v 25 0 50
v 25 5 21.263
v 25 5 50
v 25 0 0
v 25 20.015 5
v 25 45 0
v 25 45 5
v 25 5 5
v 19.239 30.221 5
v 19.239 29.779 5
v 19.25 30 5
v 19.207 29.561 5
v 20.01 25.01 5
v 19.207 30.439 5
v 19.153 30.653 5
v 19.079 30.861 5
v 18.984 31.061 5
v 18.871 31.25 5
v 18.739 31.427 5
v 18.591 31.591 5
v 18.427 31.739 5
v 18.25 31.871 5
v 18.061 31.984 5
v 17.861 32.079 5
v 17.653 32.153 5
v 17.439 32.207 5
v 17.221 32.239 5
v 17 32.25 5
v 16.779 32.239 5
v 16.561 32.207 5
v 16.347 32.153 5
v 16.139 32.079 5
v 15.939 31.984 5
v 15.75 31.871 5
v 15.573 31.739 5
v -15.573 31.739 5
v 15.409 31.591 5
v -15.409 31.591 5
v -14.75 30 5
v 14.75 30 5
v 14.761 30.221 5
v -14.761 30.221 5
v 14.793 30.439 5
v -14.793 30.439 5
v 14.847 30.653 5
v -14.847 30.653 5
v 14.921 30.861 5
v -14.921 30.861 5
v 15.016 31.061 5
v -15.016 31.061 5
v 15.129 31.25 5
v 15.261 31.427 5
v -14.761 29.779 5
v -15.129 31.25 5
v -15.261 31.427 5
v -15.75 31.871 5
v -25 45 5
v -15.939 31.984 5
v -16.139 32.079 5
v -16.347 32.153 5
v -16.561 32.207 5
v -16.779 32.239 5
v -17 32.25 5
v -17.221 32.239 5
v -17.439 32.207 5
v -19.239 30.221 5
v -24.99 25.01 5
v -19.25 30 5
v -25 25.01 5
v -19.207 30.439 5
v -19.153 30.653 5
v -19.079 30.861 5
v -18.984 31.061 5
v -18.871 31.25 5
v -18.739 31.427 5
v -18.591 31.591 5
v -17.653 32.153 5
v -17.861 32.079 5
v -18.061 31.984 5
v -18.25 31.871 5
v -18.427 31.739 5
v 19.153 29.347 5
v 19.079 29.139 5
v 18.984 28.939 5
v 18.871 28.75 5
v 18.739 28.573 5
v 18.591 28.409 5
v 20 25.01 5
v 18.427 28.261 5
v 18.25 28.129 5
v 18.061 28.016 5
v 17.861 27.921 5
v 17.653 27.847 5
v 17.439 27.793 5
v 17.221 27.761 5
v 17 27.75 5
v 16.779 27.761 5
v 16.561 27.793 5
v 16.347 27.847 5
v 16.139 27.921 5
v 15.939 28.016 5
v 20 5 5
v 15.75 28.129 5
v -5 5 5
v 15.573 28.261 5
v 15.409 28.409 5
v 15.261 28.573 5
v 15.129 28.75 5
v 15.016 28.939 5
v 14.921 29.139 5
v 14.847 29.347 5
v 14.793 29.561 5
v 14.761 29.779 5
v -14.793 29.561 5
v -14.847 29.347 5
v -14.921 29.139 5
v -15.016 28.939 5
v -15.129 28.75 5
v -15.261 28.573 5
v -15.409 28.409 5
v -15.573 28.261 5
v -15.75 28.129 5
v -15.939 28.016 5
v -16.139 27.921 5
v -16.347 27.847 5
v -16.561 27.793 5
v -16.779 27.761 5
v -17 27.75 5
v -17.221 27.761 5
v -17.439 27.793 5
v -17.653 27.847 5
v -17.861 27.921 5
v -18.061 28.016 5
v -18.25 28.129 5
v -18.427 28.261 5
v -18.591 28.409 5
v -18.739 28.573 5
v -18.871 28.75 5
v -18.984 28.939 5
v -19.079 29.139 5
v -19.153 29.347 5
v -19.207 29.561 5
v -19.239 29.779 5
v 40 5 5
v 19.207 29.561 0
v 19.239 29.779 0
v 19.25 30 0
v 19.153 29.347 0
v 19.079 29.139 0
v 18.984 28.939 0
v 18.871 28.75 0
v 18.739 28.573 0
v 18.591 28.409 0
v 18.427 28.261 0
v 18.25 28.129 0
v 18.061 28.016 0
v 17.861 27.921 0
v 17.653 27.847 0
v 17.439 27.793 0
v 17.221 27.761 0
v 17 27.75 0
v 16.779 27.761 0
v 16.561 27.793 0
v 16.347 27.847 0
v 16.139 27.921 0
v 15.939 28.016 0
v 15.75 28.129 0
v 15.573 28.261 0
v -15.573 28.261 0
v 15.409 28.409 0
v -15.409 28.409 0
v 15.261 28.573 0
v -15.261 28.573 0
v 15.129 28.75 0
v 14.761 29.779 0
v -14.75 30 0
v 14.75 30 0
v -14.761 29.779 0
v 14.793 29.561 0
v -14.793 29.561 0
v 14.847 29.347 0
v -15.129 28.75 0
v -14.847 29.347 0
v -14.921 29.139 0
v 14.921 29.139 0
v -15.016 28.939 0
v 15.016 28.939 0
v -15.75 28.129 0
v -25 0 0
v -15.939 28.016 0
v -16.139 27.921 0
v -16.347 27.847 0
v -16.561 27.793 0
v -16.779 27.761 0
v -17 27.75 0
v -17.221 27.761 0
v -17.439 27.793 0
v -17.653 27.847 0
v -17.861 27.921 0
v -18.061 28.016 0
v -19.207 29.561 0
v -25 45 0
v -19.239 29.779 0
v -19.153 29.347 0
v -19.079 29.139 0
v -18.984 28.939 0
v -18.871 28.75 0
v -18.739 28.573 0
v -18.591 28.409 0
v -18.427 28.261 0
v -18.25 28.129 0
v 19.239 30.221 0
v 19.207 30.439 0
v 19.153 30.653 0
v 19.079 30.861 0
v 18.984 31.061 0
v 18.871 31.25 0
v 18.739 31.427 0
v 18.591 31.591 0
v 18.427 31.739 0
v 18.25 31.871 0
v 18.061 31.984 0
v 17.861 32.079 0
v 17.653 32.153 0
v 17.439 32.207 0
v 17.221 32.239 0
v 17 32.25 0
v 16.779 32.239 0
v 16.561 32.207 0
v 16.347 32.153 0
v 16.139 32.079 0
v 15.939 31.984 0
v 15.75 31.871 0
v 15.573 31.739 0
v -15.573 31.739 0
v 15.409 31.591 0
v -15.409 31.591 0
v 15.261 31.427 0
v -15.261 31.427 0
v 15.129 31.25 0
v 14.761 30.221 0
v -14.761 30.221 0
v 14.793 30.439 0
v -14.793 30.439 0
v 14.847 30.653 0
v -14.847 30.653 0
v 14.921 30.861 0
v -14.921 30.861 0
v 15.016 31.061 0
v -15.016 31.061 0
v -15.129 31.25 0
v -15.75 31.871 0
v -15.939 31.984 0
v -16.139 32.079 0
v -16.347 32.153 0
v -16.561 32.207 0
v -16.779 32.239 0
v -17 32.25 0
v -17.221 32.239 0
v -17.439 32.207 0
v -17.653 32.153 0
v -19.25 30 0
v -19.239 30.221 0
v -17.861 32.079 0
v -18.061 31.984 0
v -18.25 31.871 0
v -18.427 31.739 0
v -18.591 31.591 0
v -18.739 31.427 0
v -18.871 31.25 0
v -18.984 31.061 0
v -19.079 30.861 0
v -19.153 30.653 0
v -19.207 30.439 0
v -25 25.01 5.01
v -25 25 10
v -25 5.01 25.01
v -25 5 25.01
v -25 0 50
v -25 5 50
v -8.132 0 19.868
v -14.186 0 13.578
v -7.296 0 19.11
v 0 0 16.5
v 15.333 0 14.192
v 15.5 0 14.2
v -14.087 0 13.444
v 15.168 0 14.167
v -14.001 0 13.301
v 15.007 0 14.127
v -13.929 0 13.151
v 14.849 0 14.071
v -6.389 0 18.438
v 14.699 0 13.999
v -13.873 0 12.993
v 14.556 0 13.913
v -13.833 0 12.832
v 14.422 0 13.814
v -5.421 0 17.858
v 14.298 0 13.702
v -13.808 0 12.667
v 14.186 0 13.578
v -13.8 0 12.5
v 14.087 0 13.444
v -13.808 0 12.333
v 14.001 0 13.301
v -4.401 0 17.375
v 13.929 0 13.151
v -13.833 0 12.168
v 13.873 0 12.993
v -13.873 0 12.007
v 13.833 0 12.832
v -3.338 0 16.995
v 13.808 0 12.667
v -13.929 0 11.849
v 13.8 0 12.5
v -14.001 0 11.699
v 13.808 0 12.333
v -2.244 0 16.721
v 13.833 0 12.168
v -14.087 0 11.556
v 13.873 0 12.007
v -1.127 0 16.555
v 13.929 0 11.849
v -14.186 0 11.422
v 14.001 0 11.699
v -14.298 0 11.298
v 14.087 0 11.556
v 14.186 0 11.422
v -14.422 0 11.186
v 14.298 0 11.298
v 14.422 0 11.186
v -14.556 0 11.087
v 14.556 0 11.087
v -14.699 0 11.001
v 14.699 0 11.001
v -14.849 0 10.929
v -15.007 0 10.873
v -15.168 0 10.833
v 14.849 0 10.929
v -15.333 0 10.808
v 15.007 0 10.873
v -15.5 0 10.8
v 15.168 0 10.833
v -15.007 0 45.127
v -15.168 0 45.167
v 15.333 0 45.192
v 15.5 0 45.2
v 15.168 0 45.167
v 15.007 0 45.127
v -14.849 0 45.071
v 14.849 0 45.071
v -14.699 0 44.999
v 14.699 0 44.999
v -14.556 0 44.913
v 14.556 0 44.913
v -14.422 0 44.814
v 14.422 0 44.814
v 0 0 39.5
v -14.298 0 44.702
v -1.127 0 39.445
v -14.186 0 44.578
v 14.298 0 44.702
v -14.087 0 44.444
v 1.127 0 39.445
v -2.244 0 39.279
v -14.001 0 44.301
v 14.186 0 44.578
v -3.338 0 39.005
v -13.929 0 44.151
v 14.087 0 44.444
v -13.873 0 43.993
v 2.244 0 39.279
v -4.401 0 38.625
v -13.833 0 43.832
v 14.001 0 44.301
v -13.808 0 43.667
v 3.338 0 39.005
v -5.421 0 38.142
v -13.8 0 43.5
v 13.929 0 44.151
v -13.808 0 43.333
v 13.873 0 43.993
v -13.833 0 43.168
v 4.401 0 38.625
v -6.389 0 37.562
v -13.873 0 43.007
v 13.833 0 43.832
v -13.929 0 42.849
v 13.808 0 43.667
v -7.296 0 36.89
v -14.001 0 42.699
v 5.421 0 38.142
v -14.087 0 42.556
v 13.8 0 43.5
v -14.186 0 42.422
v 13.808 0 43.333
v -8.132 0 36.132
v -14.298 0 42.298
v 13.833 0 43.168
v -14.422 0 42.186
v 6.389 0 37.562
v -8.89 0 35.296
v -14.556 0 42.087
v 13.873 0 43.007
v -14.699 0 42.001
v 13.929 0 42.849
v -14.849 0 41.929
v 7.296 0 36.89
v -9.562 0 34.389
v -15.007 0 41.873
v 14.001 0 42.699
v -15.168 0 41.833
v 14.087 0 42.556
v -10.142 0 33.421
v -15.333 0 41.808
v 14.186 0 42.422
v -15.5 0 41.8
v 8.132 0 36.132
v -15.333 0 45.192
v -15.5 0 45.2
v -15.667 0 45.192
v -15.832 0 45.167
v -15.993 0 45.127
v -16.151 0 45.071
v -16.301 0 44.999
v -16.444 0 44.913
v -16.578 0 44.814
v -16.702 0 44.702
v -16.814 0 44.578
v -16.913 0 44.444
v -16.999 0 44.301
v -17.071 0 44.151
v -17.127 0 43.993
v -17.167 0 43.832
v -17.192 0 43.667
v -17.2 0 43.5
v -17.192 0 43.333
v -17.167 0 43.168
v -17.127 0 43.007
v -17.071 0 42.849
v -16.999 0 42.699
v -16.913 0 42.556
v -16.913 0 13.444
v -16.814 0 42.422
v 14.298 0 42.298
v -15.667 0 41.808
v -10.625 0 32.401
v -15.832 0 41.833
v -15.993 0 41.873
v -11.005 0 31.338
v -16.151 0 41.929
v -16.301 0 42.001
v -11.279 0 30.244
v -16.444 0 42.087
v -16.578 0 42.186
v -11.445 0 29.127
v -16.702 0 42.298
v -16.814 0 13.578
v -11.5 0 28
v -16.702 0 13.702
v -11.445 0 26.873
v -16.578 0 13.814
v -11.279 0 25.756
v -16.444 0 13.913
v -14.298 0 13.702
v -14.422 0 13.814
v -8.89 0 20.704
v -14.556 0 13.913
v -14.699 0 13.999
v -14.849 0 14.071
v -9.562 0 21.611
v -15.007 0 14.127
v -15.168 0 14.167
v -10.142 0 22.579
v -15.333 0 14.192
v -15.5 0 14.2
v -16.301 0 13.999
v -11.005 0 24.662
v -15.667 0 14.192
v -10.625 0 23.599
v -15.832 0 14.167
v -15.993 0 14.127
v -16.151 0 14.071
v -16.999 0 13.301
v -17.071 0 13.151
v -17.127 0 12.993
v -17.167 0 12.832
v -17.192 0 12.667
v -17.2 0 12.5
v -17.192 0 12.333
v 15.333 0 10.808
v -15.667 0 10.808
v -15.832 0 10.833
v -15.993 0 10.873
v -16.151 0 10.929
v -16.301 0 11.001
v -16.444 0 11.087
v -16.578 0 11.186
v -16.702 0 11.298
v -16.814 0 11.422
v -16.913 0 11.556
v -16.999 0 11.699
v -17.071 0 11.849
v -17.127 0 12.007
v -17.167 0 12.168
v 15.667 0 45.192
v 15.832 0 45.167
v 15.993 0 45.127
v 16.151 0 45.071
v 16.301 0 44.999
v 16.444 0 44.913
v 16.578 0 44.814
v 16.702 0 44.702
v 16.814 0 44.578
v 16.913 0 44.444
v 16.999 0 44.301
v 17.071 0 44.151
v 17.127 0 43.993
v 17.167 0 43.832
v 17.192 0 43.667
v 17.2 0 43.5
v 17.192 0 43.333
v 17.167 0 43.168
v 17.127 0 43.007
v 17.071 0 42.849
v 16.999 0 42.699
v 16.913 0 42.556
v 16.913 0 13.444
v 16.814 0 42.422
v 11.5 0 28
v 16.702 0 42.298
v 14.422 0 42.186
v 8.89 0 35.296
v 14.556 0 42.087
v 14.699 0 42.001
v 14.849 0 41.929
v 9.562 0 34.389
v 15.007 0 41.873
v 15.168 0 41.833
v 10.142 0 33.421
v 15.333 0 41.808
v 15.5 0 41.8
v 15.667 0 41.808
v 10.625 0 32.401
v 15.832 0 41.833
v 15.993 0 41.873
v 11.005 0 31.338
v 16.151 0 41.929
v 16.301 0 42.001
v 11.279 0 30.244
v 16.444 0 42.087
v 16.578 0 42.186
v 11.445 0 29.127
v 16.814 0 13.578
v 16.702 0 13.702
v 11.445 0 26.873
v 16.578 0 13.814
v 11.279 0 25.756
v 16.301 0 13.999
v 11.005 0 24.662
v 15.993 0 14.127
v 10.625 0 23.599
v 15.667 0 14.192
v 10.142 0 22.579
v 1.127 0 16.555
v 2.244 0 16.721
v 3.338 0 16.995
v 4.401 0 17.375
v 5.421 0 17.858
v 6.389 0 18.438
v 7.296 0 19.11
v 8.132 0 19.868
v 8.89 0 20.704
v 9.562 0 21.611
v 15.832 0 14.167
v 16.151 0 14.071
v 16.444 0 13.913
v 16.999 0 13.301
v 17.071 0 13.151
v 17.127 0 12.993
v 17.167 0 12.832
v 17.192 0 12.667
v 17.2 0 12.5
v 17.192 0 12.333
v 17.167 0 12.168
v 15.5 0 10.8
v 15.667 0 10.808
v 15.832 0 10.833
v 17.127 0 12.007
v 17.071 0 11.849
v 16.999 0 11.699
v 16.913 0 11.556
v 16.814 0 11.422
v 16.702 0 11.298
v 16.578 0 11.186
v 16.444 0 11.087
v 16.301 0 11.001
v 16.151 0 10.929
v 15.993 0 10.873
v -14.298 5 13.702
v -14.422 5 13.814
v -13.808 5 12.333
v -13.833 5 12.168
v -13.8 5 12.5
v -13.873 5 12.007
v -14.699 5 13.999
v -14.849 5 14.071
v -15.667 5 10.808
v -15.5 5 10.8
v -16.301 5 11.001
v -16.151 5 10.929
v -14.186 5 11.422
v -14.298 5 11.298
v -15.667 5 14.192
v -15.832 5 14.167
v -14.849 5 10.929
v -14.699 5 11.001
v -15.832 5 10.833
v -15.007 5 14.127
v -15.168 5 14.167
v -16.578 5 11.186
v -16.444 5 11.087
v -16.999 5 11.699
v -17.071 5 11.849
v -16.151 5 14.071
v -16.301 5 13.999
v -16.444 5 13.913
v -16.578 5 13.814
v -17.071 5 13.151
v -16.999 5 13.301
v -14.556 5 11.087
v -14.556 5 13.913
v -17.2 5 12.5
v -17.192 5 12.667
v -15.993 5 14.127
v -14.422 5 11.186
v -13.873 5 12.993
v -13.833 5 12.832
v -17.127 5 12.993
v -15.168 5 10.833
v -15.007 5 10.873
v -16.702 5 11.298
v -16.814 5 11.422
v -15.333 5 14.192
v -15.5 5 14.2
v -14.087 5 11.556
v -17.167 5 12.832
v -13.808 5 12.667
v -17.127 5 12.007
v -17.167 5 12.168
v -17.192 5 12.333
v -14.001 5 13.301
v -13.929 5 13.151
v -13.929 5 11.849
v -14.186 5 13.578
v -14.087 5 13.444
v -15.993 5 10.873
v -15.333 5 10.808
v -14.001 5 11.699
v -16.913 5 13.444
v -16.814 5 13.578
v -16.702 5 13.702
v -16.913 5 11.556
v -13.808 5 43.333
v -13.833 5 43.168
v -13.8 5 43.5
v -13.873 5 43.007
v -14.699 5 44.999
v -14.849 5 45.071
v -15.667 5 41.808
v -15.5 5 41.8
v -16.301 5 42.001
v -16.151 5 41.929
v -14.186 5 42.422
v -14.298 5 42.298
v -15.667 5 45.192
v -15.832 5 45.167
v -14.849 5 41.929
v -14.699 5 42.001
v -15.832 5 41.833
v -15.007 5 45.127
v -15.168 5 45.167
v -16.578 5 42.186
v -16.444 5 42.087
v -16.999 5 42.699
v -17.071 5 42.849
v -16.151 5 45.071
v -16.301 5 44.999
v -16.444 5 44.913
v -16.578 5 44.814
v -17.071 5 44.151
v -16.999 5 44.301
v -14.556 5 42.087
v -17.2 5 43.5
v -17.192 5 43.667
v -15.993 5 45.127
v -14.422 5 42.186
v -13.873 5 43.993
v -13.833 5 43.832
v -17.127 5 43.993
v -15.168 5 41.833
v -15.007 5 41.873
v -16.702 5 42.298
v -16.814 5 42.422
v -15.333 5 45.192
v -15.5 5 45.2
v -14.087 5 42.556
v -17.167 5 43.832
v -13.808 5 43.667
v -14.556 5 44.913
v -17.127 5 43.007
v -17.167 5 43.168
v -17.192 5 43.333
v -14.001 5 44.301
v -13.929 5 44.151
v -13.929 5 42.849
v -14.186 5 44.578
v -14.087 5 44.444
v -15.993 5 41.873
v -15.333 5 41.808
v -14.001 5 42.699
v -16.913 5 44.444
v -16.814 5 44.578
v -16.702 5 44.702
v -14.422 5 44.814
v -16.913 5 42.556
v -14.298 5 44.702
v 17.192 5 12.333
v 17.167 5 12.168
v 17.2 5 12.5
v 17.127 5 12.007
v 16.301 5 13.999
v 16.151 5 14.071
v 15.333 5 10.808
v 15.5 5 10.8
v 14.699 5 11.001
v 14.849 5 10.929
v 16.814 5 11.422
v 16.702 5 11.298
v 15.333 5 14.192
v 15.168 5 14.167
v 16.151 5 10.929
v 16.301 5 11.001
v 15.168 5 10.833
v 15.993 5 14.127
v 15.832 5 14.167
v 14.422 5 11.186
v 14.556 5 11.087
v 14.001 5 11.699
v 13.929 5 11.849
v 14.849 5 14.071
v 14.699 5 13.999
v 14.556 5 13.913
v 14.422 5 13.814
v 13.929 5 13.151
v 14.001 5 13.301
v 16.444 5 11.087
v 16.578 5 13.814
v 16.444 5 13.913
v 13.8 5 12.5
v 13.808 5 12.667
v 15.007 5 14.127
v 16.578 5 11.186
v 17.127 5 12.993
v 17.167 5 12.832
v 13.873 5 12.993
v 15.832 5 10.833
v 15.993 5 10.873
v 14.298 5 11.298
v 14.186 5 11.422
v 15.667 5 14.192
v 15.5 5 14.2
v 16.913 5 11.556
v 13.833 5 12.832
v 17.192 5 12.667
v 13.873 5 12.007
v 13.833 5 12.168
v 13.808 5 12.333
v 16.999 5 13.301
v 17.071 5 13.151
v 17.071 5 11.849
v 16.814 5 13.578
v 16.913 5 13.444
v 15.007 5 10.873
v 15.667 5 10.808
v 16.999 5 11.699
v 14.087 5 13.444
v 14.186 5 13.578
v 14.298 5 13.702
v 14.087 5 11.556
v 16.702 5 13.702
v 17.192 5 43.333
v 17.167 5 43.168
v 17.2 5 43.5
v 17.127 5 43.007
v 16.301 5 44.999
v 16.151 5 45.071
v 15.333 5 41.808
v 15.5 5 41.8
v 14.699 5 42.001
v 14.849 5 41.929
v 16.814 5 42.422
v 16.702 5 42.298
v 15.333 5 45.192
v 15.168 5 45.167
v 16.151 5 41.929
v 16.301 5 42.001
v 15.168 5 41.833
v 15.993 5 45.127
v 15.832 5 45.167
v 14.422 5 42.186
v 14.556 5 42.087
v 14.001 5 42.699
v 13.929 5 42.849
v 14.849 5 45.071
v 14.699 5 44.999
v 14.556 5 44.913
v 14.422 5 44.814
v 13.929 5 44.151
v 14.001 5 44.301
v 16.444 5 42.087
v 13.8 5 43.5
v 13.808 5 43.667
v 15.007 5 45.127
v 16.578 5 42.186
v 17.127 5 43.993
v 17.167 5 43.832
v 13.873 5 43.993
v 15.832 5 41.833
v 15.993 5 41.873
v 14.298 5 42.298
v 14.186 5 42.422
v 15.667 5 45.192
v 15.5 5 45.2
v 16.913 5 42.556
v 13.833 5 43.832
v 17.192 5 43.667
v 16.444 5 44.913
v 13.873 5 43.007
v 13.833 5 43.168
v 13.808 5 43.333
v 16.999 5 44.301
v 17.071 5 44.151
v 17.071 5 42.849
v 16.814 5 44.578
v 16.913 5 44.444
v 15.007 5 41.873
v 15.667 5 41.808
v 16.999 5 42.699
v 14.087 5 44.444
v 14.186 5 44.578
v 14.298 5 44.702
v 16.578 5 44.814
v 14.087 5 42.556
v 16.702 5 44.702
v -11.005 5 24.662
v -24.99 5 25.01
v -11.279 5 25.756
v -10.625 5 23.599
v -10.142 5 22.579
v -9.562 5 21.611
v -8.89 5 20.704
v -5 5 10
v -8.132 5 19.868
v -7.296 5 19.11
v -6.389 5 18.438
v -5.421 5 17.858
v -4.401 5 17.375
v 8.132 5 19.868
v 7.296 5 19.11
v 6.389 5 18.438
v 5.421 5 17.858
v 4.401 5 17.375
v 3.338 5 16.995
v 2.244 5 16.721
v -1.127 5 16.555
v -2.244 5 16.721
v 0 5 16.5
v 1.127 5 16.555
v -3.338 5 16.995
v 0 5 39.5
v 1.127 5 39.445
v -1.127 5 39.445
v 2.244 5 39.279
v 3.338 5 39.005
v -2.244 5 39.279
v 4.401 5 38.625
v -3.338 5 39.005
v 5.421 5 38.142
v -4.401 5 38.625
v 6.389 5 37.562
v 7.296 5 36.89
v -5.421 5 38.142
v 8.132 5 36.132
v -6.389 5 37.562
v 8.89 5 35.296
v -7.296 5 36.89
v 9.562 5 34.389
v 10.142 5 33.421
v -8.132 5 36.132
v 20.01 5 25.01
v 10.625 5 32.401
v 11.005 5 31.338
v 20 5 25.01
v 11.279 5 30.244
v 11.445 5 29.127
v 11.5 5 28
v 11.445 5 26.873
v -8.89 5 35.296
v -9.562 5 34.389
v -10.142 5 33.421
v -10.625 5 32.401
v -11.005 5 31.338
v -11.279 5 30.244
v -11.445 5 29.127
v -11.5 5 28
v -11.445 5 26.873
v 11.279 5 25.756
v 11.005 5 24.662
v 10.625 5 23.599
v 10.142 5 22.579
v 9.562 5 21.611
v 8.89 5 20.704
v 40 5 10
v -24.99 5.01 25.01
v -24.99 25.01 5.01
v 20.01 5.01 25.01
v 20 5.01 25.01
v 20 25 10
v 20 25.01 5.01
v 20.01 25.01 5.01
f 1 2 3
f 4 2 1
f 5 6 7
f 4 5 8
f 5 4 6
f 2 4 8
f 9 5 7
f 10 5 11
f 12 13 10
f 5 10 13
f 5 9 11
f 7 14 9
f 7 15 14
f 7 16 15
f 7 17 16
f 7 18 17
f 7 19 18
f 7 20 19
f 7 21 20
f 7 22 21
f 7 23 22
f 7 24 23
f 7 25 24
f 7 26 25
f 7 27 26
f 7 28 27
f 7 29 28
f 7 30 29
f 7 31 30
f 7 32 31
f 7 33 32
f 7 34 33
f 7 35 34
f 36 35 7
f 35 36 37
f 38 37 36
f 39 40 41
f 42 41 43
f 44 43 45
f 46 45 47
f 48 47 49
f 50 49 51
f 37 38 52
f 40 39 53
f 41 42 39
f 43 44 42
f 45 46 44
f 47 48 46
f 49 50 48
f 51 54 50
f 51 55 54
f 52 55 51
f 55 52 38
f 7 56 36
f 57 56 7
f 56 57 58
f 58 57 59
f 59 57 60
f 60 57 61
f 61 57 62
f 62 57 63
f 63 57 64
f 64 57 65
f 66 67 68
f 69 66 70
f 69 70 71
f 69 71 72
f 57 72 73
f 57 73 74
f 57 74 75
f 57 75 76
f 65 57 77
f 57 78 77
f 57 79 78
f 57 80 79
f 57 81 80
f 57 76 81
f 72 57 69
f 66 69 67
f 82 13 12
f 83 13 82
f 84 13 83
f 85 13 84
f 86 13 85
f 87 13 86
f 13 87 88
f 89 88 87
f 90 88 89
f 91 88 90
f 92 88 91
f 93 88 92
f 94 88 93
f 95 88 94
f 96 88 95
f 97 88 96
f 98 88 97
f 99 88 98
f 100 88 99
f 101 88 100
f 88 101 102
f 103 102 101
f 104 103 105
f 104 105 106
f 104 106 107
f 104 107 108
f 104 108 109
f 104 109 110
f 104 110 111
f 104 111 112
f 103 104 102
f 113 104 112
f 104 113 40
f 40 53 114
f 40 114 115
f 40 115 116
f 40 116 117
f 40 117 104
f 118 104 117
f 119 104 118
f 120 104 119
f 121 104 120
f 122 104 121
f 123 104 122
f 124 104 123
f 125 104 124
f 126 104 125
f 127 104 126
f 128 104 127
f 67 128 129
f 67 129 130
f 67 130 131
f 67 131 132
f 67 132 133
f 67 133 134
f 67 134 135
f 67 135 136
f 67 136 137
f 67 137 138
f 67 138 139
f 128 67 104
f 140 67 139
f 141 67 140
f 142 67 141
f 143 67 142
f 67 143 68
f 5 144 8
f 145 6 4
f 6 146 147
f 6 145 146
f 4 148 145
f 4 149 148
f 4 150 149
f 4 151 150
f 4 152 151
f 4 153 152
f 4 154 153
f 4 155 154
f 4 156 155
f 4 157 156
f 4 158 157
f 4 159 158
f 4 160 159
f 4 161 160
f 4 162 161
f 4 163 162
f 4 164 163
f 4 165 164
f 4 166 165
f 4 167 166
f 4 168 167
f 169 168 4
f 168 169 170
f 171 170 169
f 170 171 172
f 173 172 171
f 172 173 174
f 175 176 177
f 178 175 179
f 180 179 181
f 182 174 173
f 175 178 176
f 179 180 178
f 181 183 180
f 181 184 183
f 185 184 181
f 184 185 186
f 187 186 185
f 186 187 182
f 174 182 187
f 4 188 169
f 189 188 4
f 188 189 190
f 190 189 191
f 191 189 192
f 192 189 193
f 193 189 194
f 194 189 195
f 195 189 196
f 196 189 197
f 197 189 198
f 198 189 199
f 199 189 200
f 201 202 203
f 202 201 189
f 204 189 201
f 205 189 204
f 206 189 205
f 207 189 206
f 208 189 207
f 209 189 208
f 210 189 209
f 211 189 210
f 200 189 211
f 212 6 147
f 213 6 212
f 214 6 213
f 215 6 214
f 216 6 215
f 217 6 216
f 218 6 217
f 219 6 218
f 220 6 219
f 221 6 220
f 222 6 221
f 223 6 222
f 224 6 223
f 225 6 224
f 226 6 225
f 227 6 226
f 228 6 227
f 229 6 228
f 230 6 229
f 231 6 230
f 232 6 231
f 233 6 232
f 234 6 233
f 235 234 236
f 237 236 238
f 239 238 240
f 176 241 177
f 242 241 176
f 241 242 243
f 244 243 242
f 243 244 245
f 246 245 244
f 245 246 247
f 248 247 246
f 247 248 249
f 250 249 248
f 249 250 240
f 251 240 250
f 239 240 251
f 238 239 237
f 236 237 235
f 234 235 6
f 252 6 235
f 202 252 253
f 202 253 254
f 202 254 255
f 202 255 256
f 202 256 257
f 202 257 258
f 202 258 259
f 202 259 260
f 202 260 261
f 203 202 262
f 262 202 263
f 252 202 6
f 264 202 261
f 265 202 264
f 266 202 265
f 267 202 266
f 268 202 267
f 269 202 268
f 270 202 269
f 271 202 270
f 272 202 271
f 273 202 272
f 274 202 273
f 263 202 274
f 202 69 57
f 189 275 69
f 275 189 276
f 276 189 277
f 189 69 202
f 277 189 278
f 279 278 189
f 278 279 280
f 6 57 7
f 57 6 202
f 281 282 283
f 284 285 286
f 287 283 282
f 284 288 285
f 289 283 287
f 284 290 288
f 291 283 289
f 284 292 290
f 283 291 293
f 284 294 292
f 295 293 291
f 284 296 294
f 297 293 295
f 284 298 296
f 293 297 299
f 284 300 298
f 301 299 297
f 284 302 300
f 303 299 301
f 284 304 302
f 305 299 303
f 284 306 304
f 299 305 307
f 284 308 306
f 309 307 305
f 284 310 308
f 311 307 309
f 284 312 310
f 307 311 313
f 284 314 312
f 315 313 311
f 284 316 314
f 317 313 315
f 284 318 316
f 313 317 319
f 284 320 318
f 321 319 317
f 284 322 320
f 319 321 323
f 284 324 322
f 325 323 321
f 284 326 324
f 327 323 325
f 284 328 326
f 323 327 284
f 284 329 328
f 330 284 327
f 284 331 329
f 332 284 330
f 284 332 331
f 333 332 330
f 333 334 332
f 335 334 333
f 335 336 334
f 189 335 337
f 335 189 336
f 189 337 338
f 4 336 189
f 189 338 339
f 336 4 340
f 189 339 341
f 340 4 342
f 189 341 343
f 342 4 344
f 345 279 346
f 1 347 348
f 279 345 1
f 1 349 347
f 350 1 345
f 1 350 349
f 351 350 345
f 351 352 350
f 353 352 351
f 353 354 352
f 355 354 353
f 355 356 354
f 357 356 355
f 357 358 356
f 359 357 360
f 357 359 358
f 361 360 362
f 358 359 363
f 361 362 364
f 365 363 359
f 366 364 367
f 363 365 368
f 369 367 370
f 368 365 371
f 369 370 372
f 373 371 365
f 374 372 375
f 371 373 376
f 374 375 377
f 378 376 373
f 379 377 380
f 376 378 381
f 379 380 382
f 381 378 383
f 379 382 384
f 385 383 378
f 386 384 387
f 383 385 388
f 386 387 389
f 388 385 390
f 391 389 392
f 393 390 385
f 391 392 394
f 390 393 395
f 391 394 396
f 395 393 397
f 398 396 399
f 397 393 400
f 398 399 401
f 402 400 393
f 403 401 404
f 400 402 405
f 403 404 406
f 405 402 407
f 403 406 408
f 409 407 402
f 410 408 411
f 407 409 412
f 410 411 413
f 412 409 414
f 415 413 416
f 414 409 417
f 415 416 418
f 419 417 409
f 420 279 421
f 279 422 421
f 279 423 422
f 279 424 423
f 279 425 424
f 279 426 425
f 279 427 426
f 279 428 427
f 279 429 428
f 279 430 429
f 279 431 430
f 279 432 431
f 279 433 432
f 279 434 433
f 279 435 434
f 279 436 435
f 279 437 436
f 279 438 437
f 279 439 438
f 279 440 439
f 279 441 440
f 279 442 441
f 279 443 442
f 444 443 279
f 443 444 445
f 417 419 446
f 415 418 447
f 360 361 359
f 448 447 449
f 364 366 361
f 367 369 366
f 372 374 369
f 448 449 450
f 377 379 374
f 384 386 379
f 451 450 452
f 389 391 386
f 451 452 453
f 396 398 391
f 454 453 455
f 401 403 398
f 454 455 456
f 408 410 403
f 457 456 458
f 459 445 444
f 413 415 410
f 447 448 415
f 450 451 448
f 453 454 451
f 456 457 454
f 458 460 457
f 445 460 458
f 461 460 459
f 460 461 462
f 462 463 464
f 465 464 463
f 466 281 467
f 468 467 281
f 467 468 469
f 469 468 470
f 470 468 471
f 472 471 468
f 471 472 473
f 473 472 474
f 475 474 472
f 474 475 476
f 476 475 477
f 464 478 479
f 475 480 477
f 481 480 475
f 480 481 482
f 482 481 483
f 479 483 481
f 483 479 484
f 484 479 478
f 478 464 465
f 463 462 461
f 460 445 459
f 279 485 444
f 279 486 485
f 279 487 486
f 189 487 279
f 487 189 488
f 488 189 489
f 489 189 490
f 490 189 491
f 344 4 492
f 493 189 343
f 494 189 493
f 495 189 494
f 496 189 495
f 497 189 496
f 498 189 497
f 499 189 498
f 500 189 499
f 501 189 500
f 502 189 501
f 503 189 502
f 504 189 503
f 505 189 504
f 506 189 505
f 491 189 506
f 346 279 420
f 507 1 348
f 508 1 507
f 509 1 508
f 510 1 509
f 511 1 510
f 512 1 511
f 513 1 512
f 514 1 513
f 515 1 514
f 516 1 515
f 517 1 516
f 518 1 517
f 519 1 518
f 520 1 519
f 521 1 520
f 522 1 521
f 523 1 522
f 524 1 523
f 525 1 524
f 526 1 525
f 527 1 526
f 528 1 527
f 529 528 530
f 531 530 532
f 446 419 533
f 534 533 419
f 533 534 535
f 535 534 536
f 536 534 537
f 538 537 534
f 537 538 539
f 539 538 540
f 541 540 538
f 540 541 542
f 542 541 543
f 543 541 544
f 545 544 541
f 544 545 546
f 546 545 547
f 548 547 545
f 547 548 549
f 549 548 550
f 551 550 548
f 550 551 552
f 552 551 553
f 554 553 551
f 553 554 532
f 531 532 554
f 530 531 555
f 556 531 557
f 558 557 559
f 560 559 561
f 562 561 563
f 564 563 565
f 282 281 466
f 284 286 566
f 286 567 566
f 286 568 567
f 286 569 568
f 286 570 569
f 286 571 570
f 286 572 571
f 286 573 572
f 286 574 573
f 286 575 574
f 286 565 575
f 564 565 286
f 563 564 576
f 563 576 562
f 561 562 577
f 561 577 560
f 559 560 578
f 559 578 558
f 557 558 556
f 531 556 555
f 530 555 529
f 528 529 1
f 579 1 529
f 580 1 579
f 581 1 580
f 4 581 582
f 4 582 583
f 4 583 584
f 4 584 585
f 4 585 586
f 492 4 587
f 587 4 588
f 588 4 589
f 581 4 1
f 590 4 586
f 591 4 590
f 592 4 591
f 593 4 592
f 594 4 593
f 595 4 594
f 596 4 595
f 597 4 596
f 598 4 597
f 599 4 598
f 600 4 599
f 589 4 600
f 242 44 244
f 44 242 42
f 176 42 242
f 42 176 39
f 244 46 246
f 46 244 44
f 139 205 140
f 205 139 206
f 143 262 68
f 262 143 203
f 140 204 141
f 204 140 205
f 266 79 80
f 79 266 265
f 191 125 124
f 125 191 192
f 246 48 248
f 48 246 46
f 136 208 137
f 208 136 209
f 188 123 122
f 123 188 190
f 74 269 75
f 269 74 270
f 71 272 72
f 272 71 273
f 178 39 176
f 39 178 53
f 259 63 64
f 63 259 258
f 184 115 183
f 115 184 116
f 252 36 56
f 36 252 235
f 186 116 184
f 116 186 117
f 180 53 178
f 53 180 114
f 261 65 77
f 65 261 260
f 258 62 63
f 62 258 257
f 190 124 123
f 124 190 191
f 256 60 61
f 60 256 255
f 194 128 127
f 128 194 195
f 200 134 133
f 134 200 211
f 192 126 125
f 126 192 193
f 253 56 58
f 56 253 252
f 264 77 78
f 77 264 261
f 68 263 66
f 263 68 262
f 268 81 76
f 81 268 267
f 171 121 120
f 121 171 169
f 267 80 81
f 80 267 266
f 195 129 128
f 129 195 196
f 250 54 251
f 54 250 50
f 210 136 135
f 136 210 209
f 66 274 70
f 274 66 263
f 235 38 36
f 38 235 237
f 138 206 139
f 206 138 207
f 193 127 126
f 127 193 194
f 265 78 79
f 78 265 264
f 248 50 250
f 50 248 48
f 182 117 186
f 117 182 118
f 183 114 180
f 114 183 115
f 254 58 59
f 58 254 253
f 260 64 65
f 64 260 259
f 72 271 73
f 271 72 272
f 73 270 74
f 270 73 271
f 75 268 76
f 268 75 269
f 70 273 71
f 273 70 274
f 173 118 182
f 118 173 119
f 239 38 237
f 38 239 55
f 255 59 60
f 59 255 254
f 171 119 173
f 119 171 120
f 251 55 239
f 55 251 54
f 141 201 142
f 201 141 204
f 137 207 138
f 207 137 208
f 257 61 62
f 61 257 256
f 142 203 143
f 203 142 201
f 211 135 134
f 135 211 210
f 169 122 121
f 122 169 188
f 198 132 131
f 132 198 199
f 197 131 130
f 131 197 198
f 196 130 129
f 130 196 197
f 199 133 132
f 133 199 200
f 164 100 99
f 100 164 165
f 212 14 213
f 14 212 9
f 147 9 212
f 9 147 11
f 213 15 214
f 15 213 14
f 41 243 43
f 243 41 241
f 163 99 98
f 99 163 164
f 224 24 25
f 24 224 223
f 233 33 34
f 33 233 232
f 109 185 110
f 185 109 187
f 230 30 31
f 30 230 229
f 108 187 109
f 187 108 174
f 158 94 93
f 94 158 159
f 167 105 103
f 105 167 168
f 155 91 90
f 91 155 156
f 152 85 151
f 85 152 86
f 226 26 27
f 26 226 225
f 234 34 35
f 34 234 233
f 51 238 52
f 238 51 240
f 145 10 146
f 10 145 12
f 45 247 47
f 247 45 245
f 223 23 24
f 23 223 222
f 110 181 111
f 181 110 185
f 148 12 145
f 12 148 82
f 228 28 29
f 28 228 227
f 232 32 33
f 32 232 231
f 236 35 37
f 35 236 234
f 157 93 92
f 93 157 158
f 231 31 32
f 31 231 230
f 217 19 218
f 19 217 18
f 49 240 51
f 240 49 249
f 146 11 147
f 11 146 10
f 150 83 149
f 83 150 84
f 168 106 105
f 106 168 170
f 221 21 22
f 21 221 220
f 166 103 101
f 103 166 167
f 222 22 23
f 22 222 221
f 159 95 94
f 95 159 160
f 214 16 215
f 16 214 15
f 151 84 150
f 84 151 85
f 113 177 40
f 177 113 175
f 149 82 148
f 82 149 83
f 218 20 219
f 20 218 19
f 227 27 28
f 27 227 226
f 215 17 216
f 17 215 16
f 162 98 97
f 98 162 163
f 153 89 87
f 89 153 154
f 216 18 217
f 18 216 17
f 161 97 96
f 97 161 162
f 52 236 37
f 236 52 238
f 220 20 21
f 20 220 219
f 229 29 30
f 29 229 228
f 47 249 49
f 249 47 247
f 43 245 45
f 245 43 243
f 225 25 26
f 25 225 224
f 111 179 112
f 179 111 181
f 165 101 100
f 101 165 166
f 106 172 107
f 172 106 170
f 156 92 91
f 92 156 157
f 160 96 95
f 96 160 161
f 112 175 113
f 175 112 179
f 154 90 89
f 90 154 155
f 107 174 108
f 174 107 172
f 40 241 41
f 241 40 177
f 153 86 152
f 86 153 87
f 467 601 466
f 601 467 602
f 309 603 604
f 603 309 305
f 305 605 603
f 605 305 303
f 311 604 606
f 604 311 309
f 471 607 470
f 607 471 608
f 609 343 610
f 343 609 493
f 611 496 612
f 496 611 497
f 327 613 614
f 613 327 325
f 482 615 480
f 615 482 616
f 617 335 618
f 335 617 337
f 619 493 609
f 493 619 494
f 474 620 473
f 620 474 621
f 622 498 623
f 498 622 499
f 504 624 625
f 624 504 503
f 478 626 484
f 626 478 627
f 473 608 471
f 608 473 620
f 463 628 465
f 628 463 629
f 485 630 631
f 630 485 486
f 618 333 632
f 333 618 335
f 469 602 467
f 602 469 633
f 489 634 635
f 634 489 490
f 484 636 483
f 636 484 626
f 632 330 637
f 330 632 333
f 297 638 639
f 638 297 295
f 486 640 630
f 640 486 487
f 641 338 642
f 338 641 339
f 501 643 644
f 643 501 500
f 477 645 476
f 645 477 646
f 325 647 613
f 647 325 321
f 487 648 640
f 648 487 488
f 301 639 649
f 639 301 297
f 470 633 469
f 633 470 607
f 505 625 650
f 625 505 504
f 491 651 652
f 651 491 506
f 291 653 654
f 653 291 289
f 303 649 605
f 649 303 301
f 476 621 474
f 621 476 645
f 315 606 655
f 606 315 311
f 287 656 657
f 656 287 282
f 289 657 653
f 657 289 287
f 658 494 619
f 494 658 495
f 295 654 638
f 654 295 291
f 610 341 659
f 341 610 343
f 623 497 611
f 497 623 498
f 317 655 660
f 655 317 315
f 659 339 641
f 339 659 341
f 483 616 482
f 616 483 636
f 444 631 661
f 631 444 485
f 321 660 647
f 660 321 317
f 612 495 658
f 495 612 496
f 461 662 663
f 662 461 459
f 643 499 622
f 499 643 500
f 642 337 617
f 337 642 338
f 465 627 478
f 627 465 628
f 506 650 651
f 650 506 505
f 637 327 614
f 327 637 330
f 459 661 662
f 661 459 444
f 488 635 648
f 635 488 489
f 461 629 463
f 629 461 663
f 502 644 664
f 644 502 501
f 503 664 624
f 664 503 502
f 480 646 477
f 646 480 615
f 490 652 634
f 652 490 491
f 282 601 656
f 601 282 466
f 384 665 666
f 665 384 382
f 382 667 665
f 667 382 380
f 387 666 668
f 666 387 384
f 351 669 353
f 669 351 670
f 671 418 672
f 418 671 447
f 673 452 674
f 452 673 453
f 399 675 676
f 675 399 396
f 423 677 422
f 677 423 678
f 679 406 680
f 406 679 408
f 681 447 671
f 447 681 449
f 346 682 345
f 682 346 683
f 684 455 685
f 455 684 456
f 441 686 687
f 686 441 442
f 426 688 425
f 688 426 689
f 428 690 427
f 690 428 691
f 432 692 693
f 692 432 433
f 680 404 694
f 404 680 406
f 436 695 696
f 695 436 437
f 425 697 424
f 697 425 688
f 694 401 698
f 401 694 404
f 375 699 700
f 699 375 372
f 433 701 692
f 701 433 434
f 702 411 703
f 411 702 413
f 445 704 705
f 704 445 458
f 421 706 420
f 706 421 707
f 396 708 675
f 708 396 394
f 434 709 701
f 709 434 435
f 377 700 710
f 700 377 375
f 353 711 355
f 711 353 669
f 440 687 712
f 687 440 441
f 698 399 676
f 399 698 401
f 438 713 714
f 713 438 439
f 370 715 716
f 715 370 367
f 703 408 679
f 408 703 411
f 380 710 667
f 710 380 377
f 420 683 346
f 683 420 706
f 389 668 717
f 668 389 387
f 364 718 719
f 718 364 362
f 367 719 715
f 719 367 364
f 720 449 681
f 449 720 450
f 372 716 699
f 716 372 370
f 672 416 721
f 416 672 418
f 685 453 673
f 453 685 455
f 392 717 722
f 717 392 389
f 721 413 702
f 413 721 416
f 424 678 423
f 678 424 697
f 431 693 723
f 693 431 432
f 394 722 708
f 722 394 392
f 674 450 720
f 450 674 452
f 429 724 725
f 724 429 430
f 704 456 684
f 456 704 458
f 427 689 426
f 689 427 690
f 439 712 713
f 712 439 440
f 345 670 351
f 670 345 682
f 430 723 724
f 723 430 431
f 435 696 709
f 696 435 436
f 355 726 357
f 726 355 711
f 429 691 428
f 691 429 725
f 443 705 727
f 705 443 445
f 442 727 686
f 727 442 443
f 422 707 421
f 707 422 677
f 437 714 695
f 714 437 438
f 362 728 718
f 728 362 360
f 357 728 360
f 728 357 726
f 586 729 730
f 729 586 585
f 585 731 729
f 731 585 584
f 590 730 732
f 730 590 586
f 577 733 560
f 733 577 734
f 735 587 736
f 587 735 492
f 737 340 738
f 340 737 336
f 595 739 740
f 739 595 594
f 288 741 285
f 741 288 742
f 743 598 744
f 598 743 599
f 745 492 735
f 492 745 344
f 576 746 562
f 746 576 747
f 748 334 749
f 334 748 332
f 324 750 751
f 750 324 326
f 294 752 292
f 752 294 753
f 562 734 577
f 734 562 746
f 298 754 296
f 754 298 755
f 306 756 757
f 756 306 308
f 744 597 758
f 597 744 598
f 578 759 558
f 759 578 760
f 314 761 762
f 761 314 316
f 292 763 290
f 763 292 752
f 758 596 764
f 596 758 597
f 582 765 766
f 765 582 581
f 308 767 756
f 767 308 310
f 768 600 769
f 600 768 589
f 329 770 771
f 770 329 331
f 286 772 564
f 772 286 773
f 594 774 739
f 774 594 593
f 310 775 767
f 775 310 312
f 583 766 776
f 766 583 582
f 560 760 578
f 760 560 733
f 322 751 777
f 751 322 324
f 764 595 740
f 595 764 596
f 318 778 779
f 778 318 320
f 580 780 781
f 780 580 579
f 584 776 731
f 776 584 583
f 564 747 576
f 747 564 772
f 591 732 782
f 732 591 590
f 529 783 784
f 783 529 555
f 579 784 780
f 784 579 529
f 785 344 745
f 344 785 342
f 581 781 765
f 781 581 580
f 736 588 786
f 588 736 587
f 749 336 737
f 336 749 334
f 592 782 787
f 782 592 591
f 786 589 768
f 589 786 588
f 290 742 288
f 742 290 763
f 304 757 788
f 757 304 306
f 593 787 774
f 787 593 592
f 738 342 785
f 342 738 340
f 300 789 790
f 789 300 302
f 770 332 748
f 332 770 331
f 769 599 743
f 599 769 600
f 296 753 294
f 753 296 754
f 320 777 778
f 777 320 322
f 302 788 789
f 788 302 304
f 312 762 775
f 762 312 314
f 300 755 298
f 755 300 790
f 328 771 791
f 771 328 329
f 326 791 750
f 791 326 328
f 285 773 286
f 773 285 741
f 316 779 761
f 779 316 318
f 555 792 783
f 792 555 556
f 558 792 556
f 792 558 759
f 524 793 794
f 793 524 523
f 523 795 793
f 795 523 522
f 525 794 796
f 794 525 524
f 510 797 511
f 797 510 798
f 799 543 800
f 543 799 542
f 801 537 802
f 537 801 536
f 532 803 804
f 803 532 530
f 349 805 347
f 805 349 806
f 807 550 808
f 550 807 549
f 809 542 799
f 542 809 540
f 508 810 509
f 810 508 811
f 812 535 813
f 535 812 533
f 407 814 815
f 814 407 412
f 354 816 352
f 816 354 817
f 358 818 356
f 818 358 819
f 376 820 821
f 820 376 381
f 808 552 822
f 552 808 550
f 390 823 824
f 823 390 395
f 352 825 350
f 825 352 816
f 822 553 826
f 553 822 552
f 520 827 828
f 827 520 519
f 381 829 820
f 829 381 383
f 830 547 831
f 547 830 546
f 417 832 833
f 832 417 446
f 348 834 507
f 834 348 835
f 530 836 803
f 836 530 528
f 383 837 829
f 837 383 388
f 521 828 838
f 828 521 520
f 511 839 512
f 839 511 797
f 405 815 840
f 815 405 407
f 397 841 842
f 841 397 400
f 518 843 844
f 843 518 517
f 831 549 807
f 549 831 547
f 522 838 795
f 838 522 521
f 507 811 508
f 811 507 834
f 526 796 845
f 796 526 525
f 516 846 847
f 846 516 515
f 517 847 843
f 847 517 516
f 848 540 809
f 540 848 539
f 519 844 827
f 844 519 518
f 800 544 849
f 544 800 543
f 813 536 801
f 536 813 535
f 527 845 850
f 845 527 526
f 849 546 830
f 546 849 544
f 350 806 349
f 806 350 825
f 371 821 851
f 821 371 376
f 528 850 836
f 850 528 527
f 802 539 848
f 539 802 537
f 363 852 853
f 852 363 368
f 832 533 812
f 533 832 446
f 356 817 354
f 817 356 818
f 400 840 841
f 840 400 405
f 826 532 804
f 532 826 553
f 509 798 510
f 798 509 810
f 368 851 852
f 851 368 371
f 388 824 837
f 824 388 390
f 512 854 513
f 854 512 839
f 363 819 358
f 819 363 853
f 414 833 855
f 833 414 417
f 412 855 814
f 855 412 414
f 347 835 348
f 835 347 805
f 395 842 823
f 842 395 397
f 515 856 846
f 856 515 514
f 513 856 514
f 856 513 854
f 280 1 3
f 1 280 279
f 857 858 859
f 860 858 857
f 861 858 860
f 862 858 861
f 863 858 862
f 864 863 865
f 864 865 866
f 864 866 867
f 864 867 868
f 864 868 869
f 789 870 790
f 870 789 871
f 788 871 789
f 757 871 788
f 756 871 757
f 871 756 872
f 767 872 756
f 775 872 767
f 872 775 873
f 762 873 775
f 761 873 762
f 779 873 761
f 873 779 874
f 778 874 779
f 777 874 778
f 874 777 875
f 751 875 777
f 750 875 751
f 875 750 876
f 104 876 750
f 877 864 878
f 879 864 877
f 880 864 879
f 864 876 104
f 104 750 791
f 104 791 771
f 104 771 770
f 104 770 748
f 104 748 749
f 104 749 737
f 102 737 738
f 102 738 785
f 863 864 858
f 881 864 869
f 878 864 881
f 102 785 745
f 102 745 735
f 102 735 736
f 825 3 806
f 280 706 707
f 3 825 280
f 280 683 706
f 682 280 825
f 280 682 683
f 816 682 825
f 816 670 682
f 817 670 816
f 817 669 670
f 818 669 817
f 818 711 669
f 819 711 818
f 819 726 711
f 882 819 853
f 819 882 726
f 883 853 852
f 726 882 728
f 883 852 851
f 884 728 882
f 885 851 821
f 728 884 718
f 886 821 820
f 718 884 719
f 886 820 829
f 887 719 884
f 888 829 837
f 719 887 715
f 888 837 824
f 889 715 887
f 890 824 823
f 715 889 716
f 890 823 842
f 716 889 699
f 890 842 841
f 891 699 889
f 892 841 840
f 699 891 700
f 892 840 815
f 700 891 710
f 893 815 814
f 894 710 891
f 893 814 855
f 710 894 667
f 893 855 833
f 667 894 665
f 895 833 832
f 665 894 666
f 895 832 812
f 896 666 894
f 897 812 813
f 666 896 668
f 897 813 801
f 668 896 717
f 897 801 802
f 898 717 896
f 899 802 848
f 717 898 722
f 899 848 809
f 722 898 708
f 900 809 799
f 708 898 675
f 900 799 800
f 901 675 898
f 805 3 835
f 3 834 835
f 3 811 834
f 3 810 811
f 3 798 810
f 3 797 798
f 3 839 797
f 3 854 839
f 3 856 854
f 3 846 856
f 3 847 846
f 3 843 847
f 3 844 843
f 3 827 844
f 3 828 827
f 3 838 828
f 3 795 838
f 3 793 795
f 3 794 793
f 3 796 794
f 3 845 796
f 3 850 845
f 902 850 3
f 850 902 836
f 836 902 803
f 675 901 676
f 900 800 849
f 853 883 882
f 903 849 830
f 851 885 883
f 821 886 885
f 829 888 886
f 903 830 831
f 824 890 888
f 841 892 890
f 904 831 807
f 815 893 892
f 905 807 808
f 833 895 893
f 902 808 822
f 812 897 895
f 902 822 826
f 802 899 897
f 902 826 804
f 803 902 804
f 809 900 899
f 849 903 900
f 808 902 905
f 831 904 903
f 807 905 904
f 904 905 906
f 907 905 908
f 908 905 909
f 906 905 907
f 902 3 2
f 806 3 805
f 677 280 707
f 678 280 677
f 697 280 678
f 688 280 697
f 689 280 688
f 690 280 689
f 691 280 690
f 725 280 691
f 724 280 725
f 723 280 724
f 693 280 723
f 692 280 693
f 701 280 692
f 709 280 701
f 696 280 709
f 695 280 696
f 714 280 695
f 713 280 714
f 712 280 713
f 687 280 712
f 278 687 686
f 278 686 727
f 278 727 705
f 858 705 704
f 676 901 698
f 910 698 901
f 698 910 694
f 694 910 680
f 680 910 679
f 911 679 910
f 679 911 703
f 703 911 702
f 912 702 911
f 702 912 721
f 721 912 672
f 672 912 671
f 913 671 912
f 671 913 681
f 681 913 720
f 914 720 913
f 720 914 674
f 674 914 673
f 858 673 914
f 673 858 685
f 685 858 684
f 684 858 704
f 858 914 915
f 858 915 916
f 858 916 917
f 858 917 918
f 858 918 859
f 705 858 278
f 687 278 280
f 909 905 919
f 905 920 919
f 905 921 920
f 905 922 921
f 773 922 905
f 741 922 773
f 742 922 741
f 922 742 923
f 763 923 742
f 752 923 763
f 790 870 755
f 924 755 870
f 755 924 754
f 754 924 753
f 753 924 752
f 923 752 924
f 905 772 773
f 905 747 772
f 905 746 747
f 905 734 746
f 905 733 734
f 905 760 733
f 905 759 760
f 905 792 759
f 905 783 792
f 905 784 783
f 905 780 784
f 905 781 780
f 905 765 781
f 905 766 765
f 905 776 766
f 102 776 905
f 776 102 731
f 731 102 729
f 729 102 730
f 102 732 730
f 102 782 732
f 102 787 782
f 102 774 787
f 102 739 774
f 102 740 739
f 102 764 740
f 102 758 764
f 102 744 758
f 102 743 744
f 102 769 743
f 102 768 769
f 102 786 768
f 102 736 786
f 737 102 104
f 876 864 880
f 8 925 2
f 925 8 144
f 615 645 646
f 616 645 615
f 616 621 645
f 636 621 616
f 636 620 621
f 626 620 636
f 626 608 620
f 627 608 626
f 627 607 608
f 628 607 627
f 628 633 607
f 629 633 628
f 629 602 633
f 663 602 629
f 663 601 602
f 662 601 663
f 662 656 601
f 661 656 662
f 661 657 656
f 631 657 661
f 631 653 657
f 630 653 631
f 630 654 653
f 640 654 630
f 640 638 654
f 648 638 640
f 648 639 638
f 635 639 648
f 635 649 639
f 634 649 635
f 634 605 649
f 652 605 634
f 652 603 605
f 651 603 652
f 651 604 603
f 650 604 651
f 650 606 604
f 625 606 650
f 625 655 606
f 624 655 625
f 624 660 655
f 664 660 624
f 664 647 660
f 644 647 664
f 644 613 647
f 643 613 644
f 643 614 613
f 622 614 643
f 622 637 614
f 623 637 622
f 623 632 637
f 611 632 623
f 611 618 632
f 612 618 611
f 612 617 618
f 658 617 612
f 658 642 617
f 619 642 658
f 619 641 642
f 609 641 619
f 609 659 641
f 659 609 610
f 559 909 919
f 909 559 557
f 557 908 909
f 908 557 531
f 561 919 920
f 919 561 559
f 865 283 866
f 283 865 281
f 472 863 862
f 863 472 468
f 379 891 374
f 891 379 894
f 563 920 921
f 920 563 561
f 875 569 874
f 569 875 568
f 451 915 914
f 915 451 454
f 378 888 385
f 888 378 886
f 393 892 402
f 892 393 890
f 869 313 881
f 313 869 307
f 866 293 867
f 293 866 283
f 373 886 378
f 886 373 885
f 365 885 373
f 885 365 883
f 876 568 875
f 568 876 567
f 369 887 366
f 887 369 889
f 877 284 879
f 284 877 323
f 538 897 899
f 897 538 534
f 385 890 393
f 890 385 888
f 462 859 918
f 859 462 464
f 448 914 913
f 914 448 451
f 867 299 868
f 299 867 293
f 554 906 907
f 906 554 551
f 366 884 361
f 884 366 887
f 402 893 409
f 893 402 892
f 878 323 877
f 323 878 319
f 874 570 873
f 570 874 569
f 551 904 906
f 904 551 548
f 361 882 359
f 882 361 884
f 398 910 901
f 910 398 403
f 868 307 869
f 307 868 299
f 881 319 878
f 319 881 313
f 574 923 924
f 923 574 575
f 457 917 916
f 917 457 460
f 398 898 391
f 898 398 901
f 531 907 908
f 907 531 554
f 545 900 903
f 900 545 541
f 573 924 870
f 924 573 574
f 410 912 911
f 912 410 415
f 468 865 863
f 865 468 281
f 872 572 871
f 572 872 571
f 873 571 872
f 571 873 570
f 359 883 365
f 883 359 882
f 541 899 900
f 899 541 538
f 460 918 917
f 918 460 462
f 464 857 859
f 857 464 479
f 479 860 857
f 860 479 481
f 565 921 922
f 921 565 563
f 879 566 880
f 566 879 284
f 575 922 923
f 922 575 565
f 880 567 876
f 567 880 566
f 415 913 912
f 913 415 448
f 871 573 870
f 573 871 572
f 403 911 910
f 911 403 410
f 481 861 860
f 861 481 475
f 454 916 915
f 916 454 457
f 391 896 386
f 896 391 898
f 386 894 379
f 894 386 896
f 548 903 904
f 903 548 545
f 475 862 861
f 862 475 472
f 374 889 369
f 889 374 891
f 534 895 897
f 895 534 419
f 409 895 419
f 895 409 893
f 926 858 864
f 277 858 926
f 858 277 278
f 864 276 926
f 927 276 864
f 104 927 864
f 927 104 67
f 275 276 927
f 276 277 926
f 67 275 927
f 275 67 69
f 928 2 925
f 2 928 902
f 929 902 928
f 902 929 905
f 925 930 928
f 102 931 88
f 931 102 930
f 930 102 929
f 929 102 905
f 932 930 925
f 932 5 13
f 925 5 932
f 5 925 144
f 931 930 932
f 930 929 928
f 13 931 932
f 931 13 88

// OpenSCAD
// L-Shaped NEMA 17 Motor Bracket for Syringe Pump
// Print Orientation: Base plate on XY plane (Z=0)

// --- Dimensions ---
// Base Plate
base_width_x = 50;           // From -25 to 25
base_depth_y = 45;           // From 0 to 45
base_height_z = 5;           // Thickness of base
base_hole_dia = 4.5;         // M4 through-holes
base_hole_x1 = -17;          // X position of hole 1
base_hole_x2 = 17;           // X position of hole 2
base_hole_y = 30;            // Y position of holes

// Vertical Motor Plate
motor_plate_width_x = 50;    // From -25 to 25
motor_plate_depth_y = 5;     // Thickness of vertical plate
motor_plate_height_z = 50;   // Total height from Z=0
motor_boss_dia = 23;         // Centering boss hole diameter
motor_boss_x = 0;            // Center X
motor_boss_z = 28;           // Center Z
motor_screw_dia = 3.4;       // M3 screw holes
motor_screw_pattern = 31;    // Square pattern for M3 screws

// Gussets
gusset_thickness = 5;        // Thickness of gussets
gusset_leg_y = 20;           // Leg length along Y
gusset_leg_z = 20;           // Leg length along Z

// --- Constants ---
$fn = 64;
eps = 0.1; // Overlap for clean boolean operations

// --- Main Assembly ---

union() {
    // 1. Base Plate
    difference() {
        // Main body: x from -25 to 25, y from 0 to 45, z from 0 to 5
        translate([-base_width_x/2, 0, 0])
            cube([base_width_x, base_depth_y, base_height_z]);
        
        // M4 Through-holes: 4.5 mm vertical through-holes at (x = -17, y = 30) and (x = 17, y = 30)
        translate([base_hole_x1, base_hole_y, -eps])
            cylinder(h = base_height_z + 2*eps, d = base_hole_dia);
        translate([base_hole_x2, base_hole_y, -eps])
            cylinder(h = base_height_z + 2*eps, d = base_hole_dia);
    }

    // 2. Vertical Motor Plate
    difference() {
        // Main body: x from -25 to 25, y from 0 to 5, z from 0 to 50
        translate([-motor_plate_width_x/2, 0, 0])
            cube([motor_plate_width_x, motor_plate_depth_y, motor_plate_height_z]);
        
        // Motor Centering Boss Hole: 23 mm hole, center x=0, z=28, along Y
        translate([motor_boss_x, -eps, motor_boss_z])
            rotate([-90, 0, 0])
            cylinder(h = motor_plate_depth_y + 2*eps, d = motor_boss_dia);
        
        // M3 Screw Holes: 3.4 mm holes on a 31 mm square pattern centered on boss
        for (sx = [-1, 1], sz = [-1, 1]) {
            translate([motor_boss_x + sx * (motor_screw_pattern/2), -eps, motor_boss_z + sz * (motor_screw_pattern/2)])
                rotate([-90, 0, 0])
                cylinder(h = motor_plate_depth_y + 2*eps, d = motor_screw_dia);
        }
    }

    // 3. Gussets
    // Each is a right triangle in the YZ plane with legs 20 mm along +Y and +Z.
    // Right-angle corner at y = 5, z = 5.
    // Flush with the left and right edges (x = -25 to -20 and x = 20 to 25).
    
    // Left Gusset (X: -25 to -20)
    // We use a hull to ensure it is a solid part of the union
    hull() {
        // The corner point (X, Y, Z)
        translate([-25, 5, 5]) cube([0.01, 0.01, 0.01]); 
        // The Y-leg end point (X, Y, Z)
        translate([-25, 5 + gusset_leg_y, 5]) cube([0.01, 0.01, 0.01]);
        // The Z-leg end point (X, Y, Z)
        translate([-25, 5, 5 + gusset_leg_z]) cube([0.01, 0.01, 0.01]);
        
        // To make it a 5mm thick block from X=-25 to X=-20
        translate([-25, 5, 5]) 
            linear_extrude(height = gusset_thickness)
            polygon(points=[[0,0], [gusset_leg_y, 0], [0, gusset_leg_z]]);
    }

    // Right Gusset (X: 20 to 25)
    hull() {
        translate([20, 5, 5]) cube([0.01, 0.01, 0.01]); 
        translate([20, 5 + gusset_leg_y, 5]) cube([0.01, 0.01, 0.01]);
        translate([20, 5, 5 + gusset_leg_z]) cube([0.01, 0.01, 0.01]);
        
        translate([20, 5, 5]) 
            linear_extrude(height = gusset_thickness)
            polygon(points=[[0,0], [gusset_leg_y, 0], [0, gusset_leg_z]]);
    }
}

// Note: The previous "separate bodies" error was caused by the gussets being 
// mathematically disconnected from the main plates due to the way they were 
// translated/rotated. Using a single union and ensuring the gusset
